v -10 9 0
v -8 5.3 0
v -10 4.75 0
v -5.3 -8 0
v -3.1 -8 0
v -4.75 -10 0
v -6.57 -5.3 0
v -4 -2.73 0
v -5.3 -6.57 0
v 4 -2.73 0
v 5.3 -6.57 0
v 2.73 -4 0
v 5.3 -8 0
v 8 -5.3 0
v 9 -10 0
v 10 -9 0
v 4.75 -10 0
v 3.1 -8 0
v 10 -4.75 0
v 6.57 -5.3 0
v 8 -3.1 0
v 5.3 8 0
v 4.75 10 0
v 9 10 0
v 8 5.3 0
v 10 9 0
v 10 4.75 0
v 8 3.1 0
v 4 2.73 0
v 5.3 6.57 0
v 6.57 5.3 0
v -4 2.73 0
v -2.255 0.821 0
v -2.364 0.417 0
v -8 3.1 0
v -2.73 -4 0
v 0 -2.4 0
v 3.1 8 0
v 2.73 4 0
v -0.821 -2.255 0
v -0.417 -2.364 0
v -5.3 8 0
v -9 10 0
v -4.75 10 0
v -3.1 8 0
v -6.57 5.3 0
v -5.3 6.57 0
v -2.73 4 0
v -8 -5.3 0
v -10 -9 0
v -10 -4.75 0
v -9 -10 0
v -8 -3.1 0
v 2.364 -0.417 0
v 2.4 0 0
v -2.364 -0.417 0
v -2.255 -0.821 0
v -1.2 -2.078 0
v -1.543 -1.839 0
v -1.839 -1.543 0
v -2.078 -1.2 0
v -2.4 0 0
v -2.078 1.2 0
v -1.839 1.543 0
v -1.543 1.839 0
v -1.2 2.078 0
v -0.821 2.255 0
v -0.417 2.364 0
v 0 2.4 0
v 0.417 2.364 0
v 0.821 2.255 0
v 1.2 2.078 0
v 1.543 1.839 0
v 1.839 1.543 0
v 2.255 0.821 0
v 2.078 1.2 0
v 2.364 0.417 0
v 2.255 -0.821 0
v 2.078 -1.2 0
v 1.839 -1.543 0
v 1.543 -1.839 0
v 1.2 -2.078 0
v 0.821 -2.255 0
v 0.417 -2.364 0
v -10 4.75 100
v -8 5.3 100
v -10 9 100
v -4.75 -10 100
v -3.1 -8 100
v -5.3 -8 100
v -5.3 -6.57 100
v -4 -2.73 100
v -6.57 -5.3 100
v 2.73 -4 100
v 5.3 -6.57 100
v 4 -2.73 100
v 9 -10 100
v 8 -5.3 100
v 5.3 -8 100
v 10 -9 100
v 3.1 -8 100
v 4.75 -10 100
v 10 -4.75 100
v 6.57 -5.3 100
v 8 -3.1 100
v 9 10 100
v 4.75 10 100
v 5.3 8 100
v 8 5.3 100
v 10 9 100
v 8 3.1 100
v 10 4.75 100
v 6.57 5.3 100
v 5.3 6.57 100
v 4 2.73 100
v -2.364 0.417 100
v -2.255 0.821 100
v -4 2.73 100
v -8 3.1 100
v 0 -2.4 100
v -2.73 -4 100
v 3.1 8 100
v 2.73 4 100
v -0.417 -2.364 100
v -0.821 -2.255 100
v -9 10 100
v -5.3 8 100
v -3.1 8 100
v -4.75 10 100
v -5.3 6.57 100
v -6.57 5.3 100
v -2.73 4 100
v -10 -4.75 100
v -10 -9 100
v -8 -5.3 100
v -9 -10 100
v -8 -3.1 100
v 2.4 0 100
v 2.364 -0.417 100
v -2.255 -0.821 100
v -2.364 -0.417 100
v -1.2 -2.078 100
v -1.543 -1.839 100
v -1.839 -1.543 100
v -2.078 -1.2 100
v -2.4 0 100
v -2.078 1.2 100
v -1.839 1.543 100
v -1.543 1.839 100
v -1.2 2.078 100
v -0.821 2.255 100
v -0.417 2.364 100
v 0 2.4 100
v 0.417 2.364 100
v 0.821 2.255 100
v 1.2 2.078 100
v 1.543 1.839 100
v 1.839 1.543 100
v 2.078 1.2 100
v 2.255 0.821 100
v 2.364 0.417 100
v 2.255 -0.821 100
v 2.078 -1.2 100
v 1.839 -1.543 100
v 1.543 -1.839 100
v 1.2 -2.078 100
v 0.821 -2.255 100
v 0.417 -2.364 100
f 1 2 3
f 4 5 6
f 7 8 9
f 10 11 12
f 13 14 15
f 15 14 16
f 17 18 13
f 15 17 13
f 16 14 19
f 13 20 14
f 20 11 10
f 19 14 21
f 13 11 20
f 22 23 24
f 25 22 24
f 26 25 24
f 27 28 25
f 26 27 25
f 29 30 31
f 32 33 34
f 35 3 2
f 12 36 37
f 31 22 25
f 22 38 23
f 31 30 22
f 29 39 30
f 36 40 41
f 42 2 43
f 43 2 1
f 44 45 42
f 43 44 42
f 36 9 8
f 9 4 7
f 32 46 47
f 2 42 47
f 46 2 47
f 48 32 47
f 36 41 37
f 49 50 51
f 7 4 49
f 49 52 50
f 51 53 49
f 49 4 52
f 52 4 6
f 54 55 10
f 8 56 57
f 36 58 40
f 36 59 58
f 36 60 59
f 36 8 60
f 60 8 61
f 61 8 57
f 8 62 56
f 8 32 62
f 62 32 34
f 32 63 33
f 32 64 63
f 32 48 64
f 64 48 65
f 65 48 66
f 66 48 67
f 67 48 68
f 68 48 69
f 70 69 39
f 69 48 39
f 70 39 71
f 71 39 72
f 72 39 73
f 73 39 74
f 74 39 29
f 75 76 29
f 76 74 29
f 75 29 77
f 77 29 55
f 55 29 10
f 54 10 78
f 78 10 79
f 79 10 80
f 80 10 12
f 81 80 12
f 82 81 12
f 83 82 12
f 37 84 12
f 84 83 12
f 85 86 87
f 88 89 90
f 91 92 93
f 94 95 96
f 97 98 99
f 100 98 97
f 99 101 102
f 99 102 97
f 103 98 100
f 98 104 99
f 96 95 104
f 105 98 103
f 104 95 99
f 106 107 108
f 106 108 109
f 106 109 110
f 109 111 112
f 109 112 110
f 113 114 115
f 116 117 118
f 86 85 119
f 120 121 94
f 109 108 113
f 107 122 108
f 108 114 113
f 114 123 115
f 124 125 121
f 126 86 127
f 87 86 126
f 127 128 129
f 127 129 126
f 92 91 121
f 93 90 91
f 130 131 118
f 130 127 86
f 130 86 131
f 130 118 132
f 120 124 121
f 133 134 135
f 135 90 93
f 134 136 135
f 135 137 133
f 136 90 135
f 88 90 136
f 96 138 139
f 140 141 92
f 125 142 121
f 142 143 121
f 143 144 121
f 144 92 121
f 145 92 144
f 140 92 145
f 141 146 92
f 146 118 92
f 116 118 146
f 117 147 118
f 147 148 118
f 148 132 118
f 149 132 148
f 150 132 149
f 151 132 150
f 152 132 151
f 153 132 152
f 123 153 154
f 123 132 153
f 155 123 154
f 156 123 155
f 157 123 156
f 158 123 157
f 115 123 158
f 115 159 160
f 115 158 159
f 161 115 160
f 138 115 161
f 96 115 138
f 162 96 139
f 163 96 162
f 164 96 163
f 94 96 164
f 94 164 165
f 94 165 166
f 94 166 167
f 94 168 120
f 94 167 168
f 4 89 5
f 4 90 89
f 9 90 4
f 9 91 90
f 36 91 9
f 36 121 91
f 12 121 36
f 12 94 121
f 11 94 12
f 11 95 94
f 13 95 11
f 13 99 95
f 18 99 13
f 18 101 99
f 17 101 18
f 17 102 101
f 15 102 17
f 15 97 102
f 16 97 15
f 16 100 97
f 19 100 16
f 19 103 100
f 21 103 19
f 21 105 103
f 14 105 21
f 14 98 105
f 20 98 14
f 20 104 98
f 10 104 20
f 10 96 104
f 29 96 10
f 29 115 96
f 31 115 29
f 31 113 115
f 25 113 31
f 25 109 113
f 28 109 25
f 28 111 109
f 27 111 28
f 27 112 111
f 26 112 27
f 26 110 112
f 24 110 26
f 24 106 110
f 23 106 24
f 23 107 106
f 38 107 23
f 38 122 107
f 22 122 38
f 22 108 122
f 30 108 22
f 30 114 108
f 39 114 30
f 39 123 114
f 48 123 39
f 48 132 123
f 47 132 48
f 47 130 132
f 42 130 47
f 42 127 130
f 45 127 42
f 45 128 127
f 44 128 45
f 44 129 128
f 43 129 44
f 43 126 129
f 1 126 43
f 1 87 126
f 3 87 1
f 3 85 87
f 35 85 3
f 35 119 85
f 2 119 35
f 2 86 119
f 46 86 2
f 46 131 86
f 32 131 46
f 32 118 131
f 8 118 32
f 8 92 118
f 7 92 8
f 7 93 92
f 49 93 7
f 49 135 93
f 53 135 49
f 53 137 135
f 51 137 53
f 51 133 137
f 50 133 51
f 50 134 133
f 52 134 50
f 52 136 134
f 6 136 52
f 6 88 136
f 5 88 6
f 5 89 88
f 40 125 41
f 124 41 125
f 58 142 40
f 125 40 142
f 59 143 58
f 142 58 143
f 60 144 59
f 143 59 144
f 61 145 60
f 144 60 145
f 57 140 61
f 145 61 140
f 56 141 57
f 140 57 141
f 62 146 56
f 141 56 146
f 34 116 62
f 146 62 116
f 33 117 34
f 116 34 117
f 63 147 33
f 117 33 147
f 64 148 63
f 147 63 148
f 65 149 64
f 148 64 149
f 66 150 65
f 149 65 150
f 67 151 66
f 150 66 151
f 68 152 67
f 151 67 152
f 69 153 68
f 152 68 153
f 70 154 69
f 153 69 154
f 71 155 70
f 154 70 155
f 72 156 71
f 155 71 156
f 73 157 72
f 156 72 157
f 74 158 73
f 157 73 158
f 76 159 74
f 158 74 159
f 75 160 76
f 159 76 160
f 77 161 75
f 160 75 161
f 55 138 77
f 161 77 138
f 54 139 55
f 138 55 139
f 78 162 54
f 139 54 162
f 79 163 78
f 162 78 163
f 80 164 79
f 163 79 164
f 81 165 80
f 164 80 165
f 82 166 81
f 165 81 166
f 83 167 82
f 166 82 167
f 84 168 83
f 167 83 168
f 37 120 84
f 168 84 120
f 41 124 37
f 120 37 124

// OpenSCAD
/*
  Author: @grauerfuchs; 2020-04-29
  Licensed under CC BY-SA https://creativecommons.org/use-remix/cc-licenses/#by-sa
*/
v_rail_extrusion();
module v_rail_extrusion(size=20, height=100, smoothing=true) {
  // The polygon points are based on a 2020 extrusion, so scale based on 2020 sizing.
  linear_extrude(height) scale([size / 20, size / 20, 1]) difference() {
    oe = (smoothing) ? 9.00 : 10.00; // Outer Edge - If smoothing is enabled, knock the point off of the corners.
    for (az = [0, 90, 180, 270], mx = [0, 1]) rotate([0, 0, az]) mirror([mx, 0, 0])
      polygon(points = [
        [ 0.00,  0.00], 
        [ 0.00,  2.50], [  0.00,  4.00], [  2.73,  4.00],
        [ 5.30,  6.57], [  5.30,  8.00], [  3.10,  8.00], [  4.75, 10.00],
        [   oe, 10.00], [ 10.00,    oe]
      ]);
    circle(r=2.40, $fn=36); // Central cutout
  
  }
}
